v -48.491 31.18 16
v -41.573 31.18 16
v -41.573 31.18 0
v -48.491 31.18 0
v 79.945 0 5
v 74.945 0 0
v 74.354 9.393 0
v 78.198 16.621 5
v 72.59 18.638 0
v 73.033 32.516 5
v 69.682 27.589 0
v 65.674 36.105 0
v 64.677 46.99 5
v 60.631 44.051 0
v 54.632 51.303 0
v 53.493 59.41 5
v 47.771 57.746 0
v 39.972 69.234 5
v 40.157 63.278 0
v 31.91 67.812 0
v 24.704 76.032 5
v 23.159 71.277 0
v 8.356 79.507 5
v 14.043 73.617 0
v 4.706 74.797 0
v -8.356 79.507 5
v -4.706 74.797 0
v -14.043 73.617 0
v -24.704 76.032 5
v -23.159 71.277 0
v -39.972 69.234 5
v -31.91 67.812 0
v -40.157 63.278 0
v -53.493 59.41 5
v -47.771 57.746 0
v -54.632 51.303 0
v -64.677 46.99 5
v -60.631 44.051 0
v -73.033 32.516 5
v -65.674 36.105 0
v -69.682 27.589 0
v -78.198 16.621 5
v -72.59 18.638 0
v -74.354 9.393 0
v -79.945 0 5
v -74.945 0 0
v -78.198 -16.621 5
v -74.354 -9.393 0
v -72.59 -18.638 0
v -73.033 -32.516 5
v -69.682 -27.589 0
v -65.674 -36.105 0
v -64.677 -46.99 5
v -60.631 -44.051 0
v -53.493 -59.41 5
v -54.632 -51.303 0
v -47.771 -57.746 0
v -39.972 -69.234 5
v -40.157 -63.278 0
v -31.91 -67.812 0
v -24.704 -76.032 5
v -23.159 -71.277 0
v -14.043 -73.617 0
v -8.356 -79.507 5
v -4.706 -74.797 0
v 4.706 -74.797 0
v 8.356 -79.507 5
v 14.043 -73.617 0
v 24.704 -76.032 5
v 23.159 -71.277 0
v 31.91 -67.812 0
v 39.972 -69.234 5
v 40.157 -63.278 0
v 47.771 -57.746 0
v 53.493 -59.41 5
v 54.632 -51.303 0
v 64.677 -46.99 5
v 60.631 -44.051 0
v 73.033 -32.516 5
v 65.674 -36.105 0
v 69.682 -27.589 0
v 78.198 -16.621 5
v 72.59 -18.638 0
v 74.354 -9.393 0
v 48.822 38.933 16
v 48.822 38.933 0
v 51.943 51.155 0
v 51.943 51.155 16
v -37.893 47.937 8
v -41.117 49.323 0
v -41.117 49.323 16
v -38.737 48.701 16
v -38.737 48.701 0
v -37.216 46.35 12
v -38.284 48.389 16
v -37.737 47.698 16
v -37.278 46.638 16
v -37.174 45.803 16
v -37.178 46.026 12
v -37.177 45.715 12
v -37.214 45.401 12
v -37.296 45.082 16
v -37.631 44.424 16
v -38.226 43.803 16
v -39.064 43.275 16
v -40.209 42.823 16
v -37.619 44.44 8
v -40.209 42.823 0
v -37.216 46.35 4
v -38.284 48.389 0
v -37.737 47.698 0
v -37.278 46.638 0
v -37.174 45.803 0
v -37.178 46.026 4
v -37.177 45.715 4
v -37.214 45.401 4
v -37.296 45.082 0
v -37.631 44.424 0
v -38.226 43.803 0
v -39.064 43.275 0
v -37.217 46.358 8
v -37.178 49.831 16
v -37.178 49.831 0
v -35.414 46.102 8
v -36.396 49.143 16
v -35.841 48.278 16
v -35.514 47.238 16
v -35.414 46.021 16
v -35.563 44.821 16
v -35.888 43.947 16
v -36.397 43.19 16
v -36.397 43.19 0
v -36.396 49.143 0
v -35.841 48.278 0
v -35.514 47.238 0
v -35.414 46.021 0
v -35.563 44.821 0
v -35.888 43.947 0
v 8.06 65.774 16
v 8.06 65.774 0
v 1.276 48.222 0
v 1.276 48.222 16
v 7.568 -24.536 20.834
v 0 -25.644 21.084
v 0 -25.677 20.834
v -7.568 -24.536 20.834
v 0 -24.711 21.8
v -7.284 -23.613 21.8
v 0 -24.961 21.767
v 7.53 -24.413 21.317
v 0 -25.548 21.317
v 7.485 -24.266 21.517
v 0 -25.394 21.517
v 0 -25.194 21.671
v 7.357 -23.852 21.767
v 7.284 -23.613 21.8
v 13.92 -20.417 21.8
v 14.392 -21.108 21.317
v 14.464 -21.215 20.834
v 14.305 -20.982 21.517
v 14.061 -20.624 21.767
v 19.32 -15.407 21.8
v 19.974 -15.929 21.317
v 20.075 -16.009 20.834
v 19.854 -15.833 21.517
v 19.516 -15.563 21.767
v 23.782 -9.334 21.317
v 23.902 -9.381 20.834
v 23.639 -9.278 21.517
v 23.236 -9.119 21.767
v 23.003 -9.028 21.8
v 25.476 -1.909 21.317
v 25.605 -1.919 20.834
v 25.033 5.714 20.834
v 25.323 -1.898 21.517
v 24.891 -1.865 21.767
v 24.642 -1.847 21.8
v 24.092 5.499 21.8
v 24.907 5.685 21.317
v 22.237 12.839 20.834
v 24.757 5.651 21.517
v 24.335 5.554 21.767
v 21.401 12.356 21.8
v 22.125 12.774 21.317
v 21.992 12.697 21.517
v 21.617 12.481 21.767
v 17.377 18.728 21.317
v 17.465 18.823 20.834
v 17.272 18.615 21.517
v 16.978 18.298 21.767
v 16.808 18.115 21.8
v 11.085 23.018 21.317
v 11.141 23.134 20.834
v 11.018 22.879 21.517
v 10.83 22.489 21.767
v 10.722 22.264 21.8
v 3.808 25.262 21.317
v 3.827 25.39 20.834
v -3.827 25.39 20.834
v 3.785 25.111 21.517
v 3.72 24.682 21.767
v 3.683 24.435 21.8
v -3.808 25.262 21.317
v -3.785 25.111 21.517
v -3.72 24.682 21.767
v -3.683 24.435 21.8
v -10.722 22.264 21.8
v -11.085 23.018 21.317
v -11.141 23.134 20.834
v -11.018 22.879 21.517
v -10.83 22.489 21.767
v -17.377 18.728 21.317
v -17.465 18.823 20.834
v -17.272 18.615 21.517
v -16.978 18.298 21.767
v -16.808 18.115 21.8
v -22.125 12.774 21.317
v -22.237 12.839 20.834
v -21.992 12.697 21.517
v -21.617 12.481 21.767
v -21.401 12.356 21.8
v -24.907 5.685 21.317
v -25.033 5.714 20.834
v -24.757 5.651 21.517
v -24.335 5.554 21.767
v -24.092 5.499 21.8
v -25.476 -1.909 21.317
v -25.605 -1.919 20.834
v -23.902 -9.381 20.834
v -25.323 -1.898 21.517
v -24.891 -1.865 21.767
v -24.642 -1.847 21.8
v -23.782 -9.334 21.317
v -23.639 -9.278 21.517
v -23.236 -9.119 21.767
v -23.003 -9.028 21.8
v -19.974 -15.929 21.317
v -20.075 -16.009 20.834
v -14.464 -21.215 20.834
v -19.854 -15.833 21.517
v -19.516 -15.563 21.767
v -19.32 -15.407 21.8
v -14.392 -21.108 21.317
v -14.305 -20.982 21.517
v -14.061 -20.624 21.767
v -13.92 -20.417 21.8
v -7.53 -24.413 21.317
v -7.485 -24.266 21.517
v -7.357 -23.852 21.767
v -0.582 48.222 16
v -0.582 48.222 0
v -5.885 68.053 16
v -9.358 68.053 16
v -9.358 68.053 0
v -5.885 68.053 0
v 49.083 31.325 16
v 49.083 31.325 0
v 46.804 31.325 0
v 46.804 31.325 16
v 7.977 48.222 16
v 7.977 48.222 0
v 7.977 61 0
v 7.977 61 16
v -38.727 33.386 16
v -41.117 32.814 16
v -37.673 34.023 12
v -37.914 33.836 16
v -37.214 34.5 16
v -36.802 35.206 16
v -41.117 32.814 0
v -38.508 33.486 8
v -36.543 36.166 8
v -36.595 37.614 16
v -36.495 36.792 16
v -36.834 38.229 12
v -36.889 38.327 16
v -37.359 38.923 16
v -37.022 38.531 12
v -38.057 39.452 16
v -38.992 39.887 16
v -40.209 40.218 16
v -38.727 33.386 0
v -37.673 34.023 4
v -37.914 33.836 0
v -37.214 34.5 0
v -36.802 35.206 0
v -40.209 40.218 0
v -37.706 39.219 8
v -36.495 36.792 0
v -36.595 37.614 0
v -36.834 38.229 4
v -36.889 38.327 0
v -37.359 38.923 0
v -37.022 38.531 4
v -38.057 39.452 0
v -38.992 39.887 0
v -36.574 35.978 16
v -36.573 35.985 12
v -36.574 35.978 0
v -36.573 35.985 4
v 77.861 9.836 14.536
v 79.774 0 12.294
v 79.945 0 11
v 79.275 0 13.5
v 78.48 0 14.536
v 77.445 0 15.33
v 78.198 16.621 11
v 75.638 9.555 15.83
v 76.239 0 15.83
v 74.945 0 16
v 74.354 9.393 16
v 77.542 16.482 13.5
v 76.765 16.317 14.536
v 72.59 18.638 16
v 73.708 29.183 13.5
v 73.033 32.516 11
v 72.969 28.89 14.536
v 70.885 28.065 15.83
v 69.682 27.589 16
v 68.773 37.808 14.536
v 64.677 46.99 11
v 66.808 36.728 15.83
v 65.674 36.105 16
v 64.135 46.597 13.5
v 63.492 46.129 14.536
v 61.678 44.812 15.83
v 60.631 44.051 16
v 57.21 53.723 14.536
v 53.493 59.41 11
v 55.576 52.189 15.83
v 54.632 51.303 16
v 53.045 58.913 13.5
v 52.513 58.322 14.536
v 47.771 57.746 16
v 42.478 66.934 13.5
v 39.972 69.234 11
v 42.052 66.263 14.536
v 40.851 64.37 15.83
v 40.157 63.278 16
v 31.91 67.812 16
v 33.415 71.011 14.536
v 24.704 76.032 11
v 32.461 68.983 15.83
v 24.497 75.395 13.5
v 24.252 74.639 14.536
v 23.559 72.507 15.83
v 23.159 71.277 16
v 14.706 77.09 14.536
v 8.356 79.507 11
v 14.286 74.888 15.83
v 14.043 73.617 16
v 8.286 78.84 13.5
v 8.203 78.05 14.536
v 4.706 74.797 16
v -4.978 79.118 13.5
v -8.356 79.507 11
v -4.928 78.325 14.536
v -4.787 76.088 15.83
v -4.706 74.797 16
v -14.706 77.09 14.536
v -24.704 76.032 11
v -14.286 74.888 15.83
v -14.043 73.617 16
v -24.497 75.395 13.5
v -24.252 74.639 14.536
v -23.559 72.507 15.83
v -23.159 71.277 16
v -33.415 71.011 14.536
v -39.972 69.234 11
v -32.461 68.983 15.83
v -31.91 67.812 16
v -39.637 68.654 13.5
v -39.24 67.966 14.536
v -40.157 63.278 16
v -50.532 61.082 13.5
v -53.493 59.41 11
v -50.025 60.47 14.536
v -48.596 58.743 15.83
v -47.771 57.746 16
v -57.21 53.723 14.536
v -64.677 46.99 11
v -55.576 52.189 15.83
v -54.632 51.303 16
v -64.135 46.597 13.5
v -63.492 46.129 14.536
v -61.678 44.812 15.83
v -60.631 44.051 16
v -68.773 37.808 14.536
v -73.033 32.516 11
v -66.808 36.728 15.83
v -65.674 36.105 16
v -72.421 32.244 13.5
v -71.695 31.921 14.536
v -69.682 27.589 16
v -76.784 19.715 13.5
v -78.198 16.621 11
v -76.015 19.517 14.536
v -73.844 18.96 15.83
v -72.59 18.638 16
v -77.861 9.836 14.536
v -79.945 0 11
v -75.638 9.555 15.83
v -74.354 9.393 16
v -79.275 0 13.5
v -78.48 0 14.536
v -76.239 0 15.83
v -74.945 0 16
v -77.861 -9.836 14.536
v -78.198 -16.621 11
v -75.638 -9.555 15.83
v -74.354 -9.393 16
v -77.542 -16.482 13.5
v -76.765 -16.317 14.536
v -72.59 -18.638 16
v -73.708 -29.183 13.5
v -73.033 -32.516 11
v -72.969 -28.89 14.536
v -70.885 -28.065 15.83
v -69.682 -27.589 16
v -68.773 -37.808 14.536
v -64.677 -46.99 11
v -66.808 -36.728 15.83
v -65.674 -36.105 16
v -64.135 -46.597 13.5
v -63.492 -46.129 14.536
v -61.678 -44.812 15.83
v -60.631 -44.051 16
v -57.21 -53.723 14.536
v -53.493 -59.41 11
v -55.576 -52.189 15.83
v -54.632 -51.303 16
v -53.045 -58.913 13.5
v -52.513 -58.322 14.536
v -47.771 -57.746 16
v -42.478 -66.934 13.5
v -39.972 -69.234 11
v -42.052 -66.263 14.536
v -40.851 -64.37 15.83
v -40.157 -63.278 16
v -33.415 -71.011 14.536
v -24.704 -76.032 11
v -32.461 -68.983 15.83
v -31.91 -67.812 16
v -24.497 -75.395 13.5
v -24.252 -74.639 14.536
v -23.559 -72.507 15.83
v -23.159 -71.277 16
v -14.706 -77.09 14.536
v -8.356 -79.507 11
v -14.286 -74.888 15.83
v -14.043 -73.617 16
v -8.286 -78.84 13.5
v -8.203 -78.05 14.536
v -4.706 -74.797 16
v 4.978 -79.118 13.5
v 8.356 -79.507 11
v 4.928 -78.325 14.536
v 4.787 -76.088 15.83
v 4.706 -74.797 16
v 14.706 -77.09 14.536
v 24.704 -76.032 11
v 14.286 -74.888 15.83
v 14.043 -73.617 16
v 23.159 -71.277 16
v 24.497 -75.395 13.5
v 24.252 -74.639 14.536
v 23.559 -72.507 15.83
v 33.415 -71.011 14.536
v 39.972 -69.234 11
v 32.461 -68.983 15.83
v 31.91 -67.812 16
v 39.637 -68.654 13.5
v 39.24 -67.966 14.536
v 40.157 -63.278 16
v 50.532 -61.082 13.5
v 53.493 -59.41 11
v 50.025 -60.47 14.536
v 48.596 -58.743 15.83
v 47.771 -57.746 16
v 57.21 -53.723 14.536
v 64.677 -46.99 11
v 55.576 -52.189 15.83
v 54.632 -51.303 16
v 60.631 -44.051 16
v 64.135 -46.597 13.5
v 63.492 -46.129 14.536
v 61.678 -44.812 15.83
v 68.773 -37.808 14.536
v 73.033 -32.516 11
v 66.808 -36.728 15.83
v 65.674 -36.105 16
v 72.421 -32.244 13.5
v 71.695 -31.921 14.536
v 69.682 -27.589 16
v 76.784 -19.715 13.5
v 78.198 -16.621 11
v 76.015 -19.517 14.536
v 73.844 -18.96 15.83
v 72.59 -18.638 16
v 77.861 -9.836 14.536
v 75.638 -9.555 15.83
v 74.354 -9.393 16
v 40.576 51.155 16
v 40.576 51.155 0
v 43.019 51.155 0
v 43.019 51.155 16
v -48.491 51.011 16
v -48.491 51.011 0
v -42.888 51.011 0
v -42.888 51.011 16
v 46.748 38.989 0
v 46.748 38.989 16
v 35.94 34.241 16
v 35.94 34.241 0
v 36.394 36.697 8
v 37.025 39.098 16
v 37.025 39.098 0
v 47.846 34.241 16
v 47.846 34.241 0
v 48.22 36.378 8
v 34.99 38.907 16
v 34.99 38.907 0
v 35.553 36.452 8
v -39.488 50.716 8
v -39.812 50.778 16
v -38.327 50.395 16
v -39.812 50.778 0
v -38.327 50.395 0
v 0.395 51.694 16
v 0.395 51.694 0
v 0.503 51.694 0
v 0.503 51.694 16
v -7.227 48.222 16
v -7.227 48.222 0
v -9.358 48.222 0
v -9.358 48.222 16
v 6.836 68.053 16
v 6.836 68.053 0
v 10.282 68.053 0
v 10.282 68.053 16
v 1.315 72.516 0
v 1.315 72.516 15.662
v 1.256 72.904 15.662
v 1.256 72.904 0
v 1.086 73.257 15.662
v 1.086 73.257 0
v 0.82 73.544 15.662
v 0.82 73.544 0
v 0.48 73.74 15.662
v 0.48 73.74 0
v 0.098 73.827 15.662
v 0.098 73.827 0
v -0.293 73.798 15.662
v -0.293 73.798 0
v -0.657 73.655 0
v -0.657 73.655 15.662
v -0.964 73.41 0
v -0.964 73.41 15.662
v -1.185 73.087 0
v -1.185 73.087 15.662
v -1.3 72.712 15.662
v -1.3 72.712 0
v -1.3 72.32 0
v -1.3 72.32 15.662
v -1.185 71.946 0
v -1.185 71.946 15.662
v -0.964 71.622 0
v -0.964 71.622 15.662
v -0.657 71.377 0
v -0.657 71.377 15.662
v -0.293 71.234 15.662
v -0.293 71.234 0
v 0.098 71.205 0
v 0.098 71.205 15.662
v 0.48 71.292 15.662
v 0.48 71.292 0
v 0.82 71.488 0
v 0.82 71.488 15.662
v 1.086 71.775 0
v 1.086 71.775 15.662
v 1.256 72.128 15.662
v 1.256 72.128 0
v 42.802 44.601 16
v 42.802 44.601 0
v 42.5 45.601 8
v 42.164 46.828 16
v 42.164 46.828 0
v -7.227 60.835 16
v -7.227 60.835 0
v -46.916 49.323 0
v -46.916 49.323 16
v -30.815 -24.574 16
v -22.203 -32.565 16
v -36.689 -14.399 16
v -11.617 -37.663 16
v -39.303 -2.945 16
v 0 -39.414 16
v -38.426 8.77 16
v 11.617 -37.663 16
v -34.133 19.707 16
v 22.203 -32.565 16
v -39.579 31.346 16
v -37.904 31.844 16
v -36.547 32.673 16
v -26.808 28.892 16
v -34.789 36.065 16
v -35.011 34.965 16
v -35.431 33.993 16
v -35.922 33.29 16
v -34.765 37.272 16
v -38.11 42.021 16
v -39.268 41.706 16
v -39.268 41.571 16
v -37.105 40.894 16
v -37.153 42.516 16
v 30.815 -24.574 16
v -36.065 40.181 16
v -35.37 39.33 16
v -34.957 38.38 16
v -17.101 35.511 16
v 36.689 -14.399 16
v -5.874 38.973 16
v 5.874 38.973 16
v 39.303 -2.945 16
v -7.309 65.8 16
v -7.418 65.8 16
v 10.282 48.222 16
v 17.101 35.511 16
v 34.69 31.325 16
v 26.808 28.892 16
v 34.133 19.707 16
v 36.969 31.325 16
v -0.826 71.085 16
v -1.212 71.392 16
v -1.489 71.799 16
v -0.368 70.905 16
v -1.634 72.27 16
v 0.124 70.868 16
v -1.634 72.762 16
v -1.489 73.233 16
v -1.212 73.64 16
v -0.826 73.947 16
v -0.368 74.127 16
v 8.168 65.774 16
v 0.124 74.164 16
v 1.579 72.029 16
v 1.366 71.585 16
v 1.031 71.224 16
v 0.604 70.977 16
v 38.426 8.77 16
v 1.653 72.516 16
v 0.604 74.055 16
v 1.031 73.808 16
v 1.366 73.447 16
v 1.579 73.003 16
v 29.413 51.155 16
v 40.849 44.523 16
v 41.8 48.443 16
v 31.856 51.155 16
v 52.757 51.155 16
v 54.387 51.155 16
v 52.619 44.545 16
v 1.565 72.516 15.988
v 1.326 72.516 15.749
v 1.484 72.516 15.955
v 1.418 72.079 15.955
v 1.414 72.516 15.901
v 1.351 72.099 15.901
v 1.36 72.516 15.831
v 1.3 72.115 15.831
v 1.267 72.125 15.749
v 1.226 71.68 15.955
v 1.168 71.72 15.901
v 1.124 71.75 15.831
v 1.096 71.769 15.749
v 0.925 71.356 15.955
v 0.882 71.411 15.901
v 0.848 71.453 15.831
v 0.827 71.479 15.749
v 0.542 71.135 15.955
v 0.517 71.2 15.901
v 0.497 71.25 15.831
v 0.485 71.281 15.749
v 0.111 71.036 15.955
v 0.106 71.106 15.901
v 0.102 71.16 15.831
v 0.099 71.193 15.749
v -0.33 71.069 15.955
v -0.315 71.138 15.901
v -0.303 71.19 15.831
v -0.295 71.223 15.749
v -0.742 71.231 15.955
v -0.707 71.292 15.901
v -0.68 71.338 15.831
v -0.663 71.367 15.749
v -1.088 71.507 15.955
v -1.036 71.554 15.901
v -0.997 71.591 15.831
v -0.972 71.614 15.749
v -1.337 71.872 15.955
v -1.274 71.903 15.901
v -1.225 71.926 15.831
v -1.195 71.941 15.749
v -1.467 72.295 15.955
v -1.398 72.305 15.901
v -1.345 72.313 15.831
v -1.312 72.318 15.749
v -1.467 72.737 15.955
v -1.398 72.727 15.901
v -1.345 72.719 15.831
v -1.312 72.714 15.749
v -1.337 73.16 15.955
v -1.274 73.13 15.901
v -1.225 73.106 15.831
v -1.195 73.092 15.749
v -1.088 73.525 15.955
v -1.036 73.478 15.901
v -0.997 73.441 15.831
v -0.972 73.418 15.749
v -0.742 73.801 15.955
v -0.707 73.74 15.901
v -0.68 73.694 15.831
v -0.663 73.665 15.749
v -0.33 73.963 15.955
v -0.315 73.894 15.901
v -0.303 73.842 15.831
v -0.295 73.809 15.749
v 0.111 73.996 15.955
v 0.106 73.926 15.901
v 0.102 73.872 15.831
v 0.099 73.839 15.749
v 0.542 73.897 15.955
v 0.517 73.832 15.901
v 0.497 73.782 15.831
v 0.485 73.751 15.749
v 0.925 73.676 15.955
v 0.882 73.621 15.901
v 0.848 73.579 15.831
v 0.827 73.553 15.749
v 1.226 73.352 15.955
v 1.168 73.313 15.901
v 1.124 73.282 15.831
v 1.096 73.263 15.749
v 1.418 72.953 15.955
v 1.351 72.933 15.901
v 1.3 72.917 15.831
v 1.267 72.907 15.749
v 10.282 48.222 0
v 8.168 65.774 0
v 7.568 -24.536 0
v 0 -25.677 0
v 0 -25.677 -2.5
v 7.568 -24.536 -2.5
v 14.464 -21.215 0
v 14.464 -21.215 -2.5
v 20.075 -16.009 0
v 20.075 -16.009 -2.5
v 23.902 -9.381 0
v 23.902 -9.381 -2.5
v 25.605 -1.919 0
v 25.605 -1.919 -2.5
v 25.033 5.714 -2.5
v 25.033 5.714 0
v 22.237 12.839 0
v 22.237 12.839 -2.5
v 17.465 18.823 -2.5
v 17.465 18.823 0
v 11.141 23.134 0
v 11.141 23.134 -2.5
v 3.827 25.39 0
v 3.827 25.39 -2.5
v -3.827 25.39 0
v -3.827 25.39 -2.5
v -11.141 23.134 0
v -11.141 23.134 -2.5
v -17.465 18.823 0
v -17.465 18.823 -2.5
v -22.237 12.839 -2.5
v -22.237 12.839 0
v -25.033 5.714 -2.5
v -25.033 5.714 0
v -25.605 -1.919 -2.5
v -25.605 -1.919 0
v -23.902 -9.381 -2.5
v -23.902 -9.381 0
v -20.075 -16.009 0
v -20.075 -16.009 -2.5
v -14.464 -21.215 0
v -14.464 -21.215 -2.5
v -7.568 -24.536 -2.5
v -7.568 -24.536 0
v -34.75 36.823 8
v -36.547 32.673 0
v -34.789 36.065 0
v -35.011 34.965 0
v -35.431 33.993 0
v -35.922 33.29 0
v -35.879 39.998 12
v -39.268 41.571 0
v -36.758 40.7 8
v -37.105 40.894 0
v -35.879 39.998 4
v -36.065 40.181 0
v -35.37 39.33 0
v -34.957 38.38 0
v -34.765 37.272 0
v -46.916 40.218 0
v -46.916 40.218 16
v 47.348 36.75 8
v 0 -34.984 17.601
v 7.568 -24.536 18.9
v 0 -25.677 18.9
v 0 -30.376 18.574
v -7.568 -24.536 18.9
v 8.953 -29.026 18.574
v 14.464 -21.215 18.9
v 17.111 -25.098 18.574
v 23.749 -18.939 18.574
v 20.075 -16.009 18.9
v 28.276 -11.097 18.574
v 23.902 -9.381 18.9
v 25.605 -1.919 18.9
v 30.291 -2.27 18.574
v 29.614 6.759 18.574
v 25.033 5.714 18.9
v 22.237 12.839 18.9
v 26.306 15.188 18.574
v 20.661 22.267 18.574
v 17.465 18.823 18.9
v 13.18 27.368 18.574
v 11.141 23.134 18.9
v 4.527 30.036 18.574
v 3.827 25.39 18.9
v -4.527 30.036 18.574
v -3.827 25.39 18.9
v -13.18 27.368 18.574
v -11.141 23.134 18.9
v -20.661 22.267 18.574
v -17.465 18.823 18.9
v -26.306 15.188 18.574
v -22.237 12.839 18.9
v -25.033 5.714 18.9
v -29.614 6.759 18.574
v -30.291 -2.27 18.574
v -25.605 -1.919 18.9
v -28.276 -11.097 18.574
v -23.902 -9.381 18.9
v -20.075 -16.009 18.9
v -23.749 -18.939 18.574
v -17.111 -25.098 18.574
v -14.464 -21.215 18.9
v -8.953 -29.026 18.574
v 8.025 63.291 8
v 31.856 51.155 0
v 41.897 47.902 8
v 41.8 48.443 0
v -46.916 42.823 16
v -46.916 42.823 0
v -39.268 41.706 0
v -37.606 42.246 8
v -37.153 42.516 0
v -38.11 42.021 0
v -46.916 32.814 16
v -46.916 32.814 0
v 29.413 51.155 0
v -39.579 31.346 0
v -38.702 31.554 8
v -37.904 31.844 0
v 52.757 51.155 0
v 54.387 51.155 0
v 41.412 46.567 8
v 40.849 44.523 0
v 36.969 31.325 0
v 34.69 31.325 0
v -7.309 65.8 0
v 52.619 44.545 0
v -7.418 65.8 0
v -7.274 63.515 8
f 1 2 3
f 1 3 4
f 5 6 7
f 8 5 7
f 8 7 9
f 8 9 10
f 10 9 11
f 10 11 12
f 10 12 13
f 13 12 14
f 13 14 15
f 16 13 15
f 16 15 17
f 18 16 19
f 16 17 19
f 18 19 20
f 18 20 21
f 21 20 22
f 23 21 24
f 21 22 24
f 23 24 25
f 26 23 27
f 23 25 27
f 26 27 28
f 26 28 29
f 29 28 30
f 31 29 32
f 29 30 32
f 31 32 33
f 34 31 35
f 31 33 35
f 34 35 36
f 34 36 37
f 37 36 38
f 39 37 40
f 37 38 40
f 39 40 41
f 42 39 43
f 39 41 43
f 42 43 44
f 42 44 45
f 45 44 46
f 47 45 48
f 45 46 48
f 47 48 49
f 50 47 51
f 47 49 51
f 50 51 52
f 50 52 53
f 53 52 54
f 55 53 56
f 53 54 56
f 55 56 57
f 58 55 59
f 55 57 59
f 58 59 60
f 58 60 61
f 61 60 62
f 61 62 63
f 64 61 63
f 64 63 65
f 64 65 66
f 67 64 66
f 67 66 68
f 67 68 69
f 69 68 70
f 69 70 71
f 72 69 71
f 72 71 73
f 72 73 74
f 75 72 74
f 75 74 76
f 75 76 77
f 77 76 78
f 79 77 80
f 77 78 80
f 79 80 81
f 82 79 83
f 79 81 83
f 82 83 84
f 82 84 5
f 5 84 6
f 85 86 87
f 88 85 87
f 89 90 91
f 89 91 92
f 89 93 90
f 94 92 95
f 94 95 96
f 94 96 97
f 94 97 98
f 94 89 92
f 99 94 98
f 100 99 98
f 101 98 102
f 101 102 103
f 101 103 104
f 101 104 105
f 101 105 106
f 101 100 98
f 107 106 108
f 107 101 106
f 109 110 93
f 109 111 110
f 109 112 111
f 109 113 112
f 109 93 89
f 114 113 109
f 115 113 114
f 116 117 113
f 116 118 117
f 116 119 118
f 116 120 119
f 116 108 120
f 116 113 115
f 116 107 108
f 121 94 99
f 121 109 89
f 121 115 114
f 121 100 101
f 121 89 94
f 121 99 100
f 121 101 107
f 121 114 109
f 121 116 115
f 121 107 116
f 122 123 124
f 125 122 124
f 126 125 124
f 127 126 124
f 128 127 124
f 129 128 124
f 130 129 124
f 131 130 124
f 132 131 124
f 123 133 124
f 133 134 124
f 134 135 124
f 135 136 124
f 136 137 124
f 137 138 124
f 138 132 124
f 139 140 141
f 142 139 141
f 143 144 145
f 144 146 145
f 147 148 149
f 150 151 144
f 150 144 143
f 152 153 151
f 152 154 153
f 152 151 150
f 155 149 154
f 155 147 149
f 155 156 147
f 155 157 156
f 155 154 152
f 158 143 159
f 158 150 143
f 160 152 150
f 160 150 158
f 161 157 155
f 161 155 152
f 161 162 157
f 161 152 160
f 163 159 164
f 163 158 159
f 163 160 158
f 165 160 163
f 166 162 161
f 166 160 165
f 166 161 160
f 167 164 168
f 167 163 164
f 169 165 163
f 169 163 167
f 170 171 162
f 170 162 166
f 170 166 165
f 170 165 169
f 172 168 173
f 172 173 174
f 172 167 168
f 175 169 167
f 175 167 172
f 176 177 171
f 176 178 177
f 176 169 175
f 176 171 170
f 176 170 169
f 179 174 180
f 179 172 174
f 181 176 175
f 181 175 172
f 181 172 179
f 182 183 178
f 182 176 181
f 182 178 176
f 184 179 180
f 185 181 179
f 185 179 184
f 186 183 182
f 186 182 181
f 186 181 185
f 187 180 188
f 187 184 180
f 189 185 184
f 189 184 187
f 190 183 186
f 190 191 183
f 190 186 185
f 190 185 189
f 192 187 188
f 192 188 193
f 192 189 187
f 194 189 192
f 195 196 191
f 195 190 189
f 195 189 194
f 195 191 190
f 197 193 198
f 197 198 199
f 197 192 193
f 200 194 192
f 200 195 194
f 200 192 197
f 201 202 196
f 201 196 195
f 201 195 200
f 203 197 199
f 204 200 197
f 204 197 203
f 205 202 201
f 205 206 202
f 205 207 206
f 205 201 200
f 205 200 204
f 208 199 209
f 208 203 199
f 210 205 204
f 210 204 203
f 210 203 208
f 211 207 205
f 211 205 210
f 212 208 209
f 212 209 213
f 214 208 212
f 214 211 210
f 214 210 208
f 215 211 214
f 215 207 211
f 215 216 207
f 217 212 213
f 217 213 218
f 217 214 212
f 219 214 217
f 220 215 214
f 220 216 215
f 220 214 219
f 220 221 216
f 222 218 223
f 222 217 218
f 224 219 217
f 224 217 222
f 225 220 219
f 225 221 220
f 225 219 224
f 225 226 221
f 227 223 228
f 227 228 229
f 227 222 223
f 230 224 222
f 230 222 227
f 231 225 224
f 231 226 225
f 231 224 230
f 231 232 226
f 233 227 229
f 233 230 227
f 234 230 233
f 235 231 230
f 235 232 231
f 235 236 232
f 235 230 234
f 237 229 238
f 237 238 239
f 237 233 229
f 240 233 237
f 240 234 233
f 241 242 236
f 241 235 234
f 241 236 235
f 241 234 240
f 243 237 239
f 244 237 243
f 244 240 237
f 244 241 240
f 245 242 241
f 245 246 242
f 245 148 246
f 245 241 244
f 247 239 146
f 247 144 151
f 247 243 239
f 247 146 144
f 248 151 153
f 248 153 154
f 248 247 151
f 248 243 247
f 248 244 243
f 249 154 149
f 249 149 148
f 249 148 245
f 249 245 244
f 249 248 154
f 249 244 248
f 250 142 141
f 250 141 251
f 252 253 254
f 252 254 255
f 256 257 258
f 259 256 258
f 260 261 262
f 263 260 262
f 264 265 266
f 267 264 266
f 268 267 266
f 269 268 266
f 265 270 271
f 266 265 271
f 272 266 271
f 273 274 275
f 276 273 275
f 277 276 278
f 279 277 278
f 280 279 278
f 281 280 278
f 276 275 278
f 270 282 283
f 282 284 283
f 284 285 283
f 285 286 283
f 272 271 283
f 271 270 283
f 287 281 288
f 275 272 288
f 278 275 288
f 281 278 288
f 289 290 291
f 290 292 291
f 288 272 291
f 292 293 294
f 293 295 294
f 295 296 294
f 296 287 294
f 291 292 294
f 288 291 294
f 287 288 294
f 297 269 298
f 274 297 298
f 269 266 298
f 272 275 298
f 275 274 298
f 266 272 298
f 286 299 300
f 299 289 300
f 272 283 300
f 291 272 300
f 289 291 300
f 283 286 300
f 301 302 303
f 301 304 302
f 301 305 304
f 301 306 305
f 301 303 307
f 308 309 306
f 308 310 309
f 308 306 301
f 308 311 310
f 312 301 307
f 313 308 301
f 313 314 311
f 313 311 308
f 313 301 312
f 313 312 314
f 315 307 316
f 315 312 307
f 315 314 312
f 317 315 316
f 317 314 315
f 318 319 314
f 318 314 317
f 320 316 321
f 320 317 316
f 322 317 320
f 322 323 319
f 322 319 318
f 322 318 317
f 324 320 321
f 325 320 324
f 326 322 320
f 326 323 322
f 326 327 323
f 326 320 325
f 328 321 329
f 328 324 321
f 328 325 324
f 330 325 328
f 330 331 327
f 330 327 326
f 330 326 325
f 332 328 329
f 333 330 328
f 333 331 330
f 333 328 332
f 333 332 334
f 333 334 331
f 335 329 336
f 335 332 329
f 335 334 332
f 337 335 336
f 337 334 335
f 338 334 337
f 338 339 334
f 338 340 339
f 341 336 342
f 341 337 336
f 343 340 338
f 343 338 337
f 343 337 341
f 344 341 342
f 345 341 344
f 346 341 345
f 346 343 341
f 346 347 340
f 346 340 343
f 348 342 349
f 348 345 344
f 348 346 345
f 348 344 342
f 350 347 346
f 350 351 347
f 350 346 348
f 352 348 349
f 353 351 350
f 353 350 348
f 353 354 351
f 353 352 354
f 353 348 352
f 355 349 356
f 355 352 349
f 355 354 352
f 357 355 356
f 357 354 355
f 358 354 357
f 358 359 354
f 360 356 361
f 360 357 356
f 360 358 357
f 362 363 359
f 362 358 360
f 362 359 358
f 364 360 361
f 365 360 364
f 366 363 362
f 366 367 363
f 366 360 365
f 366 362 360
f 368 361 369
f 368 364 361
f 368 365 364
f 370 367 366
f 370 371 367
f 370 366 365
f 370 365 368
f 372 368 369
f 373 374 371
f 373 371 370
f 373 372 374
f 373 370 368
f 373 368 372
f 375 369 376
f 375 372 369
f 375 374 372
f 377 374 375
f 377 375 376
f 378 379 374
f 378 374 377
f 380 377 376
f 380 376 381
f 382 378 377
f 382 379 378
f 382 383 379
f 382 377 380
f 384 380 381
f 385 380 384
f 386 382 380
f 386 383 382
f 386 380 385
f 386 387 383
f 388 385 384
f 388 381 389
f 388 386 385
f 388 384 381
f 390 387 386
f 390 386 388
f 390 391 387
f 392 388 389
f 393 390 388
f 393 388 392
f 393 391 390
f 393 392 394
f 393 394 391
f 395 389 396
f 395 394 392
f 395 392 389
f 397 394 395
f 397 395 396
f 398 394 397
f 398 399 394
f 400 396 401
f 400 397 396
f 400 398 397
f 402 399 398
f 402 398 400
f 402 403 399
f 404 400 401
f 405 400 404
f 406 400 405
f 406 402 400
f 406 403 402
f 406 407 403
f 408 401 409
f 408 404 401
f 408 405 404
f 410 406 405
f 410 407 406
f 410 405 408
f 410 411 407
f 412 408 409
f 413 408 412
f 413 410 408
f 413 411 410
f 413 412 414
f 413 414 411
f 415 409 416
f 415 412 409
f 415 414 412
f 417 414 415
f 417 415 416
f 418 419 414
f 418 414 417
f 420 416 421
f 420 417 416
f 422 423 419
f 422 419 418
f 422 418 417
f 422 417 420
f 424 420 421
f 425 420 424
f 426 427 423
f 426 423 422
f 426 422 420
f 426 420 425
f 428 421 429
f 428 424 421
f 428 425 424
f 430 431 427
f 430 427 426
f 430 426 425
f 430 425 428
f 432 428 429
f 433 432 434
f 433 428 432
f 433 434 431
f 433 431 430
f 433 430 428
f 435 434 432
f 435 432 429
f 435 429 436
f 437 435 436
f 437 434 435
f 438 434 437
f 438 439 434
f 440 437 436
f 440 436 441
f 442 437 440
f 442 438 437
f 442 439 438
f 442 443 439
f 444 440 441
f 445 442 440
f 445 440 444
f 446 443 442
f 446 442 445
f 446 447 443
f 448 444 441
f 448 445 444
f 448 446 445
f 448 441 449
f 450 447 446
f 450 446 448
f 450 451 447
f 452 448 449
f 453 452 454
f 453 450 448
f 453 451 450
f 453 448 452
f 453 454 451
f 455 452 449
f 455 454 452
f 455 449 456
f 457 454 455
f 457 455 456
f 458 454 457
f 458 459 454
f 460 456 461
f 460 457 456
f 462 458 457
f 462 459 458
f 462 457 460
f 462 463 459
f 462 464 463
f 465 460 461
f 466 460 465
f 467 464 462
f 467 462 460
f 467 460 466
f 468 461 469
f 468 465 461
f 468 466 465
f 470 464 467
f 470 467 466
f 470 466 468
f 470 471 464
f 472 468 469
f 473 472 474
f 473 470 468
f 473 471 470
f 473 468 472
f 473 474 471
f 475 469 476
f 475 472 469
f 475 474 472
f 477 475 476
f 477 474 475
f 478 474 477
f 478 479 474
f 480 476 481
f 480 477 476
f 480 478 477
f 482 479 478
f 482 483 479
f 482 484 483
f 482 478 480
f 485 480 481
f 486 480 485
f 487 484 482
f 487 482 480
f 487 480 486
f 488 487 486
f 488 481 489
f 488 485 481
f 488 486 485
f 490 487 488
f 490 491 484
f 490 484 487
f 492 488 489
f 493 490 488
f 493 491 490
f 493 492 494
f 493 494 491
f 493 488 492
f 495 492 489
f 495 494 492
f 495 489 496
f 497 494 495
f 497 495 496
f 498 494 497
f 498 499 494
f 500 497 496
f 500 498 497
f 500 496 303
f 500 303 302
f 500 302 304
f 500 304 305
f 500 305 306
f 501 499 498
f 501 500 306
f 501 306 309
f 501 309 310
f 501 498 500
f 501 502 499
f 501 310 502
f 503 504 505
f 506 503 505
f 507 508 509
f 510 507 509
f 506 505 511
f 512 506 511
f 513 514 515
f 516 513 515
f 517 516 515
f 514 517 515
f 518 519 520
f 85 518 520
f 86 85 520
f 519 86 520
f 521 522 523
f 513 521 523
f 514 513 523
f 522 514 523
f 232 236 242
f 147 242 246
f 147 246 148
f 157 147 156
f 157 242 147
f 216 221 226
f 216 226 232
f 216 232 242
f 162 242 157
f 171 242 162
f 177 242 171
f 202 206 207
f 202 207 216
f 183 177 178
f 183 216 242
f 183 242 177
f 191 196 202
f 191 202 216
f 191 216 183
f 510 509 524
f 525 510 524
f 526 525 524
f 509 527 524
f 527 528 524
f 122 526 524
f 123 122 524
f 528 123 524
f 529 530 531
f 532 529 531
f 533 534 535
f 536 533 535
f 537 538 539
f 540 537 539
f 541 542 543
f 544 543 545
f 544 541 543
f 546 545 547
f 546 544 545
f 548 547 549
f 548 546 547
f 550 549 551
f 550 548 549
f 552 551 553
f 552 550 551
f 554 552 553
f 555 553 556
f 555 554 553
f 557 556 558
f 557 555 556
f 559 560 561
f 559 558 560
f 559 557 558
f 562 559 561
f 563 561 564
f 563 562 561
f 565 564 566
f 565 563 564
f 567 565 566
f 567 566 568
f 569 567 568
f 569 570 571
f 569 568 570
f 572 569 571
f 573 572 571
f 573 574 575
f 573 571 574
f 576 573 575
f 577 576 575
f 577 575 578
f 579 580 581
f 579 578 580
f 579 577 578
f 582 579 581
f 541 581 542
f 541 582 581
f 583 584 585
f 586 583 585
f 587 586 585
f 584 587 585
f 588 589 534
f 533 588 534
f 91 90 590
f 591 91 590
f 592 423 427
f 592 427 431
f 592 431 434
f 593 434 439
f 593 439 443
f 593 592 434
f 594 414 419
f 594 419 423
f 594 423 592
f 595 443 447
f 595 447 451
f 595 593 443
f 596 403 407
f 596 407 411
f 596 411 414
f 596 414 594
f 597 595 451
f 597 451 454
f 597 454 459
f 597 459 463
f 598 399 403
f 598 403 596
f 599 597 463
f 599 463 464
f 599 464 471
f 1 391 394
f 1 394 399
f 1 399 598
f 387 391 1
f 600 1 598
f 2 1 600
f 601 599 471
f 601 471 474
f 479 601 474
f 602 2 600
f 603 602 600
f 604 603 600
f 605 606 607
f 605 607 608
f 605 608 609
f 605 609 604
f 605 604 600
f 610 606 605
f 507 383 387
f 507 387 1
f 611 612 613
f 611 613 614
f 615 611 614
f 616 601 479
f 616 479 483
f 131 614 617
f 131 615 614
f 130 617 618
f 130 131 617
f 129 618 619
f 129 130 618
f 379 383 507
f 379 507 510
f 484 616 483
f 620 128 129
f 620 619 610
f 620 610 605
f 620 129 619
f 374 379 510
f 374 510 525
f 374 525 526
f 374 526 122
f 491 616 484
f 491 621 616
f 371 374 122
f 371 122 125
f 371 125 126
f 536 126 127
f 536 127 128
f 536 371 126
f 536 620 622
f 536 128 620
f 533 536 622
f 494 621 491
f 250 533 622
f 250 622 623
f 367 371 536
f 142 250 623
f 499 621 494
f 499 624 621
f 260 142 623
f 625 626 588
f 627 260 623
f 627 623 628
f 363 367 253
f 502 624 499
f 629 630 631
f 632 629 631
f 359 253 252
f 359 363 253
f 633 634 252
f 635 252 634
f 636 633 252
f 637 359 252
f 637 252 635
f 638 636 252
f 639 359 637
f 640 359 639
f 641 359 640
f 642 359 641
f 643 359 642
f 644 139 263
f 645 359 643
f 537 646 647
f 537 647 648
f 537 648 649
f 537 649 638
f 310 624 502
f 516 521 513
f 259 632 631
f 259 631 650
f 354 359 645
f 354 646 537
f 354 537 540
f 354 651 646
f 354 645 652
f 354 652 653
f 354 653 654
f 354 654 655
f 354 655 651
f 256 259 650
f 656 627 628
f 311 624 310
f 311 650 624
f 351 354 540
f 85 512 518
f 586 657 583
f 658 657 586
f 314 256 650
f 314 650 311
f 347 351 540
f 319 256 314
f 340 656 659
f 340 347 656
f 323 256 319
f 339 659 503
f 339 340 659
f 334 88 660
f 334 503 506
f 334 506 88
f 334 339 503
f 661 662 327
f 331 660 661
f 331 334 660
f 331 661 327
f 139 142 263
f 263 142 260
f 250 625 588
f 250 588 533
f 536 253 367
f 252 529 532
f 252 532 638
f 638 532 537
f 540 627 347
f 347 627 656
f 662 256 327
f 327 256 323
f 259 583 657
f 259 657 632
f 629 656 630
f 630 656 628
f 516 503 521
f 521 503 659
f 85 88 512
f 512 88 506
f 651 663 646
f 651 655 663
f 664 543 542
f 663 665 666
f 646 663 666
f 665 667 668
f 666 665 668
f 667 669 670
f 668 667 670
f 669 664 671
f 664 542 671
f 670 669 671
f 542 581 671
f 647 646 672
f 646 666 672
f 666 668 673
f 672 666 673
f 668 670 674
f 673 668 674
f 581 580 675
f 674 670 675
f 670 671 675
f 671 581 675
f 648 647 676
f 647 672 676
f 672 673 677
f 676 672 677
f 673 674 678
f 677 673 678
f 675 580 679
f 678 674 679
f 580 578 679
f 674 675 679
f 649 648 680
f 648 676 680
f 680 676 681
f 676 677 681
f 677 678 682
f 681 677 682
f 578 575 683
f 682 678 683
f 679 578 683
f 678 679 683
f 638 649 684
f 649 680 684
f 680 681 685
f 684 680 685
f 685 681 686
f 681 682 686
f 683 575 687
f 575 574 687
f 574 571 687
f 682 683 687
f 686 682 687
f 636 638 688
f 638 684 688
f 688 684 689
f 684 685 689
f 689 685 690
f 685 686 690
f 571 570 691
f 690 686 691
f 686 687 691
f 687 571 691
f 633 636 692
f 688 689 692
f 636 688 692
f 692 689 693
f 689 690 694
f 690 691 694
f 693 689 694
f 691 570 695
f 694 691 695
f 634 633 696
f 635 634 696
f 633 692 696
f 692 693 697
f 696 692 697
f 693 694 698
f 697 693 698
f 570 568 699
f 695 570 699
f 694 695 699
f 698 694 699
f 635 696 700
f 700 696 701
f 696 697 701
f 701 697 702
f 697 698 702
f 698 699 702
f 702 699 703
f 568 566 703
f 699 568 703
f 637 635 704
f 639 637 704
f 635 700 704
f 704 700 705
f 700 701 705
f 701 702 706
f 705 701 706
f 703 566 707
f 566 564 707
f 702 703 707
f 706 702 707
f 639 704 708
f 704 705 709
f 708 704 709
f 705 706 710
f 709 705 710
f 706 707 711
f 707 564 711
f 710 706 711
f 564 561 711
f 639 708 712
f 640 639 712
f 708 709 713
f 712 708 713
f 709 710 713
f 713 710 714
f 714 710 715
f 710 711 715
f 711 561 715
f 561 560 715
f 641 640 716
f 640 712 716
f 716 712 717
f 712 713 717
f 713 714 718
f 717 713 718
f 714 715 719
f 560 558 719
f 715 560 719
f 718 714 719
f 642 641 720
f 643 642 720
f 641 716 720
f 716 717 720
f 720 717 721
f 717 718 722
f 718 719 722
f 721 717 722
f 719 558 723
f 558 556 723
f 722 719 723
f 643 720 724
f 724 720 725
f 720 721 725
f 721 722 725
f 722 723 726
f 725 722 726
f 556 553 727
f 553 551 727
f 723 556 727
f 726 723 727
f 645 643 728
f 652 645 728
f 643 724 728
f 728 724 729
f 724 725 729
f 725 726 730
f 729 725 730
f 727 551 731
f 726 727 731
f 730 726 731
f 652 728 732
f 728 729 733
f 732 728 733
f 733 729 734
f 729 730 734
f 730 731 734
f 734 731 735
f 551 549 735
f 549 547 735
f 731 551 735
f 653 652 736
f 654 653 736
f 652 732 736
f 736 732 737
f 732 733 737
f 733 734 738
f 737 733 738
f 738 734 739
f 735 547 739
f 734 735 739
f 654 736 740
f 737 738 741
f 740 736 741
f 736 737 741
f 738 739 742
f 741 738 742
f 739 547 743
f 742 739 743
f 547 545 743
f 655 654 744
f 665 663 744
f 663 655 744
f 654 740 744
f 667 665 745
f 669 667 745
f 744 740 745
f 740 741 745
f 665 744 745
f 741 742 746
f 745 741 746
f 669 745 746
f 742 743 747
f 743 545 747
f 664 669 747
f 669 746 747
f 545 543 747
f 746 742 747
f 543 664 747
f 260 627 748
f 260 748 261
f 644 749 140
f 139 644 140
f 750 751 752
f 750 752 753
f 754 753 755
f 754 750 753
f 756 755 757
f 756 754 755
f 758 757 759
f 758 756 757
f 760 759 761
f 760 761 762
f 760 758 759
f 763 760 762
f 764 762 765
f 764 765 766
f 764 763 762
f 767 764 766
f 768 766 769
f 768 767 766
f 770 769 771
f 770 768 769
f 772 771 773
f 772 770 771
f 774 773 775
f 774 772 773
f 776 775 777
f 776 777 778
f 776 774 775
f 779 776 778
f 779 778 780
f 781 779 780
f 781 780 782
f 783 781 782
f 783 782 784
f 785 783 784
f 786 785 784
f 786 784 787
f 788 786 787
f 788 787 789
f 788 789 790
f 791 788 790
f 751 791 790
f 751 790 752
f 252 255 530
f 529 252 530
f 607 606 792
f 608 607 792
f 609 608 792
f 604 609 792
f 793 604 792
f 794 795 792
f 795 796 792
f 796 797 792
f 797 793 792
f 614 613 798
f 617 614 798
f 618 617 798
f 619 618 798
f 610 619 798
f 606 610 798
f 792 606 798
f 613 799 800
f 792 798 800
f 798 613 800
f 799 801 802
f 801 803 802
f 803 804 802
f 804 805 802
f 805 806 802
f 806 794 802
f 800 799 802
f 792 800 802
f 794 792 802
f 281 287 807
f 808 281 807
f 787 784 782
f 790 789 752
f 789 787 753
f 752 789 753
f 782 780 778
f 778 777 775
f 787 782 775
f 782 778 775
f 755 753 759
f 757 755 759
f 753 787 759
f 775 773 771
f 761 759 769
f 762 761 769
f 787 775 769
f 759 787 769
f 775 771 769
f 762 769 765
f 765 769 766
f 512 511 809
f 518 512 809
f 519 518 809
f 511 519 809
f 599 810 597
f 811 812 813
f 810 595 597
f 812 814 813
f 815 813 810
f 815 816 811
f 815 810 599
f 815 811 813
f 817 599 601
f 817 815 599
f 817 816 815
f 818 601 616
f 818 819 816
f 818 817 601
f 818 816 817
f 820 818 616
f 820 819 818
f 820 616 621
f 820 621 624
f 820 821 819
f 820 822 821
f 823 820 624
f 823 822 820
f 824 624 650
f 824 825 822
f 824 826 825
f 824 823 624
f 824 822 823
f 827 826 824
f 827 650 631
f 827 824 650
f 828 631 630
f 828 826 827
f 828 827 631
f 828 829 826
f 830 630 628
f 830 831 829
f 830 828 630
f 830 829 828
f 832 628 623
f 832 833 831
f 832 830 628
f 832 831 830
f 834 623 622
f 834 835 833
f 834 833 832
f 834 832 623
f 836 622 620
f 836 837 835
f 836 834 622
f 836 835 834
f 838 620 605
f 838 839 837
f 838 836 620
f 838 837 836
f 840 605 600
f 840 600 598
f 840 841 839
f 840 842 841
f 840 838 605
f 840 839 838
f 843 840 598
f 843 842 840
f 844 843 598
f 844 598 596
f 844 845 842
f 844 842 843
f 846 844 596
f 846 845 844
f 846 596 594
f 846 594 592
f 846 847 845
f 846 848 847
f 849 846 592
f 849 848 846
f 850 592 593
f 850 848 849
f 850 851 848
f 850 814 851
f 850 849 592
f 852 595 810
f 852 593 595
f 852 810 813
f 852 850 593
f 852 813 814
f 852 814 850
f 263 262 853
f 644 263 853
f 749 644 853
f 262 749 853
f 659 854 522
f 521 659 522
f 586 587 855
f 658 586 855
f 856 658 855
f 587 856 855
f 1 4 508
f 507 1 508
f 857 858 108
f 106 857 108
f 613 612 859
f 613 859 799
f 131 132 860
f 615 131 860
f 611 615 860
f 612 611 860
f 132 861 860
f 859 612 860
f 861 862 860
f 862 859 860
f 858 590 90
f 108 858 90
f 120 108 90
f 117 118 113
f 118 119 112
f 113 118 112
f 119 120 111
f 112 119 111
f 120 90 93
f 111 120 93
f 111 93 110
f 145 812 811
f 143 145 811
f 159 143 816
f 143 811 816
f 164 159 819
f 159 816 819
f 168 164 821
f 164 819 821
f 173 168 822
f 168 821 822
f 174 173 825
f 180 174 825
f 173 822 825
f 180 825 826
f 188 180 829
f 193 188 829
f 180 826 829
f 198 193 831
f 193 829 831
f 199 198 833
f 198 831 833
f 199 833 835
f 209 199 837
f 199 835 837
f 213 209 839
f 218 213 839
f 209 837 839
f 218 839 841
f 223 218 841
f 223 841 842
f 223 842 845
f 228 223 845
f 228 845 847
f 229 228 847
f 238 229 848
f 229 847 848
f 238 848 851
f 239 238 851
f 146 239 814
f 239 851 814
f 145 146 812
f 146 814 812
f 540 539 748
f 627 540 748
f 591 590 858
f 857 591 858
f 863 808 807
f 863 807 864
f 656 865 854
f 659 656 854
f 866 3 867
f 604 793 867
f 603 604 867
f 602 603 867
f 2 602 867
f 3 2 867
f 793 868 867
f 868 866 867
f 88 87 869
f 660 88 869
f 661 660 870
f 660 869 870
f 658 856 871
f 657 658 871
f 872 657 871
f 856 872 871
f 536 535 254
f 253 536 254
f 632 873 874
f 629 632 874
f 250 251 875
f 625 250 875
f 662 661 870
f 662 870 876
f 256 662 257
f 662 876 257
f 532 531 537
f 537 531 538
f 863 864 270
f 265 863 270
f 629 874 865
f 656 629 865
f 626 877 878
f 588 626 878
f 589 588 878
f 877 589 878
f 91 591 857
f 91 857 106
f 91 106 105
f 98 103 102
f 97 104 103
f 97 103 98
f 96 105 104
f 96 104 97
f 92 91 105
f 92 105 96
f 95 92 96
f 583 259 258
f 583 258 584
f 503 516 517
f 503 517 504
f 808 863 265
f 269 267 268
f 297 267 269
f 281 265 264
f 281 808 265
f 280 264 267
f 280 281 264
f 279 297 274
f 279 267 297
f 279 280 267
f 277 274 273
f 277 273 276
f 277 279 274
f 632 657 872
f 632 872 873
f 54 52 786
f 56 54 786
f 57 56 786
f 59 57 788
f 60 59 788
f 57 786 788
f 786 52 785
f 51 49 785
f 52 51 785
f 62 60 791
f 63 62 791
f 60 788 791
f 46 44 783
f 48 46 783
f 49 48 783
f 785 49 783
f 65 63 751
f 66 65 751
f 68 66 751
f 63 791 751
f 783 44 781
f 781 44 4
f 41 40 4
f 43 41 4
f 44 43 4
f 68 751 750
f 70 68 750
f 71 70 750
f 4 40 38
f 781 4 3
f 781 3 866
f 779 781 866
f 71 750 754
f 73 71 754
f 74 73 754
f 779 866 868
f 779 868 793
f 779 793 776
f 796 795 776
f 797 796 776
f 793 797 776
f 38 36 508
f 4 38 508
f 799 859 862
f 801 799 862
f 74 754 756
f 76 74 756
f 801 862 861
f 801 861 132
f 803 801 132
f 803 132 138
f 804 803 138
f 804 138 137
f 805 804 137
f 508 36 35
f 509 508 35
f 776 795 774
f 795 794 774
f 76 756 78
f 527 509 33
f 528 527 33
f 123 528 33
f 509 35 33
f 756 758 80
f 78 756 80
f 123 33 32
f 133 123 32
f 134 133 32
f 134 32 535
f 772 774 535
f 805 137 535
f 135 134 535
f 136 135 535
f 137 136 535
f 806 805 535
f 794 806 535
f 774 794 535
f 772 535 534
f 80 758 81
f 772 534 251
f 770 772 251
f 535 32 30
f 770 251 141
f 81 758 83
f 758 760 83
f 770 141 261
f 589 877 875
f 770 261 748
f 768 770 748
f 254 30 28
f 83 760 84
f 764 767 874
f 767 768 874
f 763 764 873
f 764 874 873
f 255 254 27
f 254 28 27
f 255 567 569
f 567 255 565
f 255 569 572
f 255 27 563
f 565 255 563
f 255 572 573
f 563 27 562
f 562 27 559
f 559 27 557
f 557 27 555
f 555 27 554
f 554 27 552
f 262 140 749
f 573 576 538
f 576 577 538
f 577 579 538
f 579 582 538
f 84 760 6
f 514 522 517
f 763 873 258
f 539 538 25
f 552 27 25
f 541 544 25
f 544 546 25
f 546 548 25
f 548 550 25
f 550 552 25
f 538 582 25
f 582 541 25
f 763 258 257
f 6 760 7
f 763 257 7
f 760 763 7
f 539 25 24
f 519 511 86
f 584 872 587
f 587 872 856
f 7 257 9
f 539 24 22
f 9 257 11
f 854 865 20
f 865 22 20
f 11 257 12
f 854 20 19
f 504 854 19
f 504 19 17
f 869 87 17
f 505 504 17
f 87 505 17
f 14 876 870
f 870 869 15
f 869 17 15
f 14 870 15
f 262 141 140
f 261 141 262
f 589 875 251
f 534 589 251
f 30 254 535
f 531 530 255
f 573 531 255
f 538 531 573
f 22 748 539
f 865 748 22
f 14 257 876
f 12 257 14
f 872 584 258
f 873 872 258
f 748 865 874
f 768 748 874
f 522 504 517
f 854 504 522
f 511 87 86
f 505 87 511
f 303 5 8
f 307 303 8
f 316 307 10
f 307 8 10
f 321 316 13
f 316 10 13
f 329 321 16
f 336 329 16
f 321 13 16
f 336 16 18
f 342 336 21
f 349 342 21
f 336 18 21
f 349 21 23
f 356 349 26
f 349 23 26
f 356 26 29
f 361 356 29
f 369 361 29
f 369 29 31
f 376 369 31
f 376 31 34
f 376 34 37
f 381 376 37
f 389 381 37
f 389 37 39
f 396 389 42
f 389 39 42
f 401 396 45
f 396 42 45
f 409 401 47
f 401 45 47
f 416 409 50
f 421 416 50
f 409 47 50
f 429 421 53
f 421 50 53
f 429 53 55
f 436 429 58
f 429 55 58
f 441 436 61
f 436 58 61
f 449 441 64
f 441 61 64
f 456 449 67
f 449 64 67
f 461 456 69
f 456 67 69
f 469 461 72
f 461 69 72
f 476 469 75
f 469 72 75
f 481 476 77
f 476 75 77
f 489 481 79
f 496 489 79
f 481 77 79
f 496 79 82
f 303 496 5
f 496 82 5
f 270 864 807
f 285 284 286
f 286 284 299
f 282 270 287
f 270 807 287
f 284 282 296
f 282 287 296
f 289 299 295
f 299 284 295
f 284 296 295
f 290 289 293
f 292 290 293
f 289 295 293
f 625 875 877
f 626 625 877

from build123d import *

# Parameters (mm, degrees)
F1_DEPTH   = 18.9
F0_R       = 79.944620776
F2_DEPTH   = 16
F4_R       = 5
F5_SIZE    = 5
F6_DEPTH   = 3
F8_DEPTH   = 2.9
F12_DEPTH  = 16
F13_DEPTH  = 24.3
F15_R      = 0.9656854249
F16_R      = 2.2829721339
F17_DEPTH  = 48.9
F18_R      = 1.3148708501
F18_R_2    = 0.6355346819
F19_DEPTH  = 41.5
F19_FACE_R = 0.6355346819
F20_DEPTH  = 21.5
F21_R      = 0.3379898987


# Not quite as in the source:
# - a fillet or chamfer that OpenCascade refuses, or shapes differently, is made with other operations: its cross-section is extruded or revolved along the edge and cut away or added
# - the program builds the solid bodies; features that only make, move or delete a surface that nothing else refers to are left out


with BuildPart() as f1:
    # F0 (on Top) → F1 (new body)
    with BuildSketch(Plane.XY):
        with BuildLine():
            Line((0, 0), (0, 41.5136932319))
            ThreePointArc((0, 41.5136932319), (-29.3546139964, 29.3546139964), (-41.5136932319, 0))
            Line((-41.5136932319, 0), (0, 0))
        make_face()
        with BuildLine():
            Line((0, 0), (41.5136932319, 0))
            ThreePointArc((41.5136932319, 0), (29.3546139964, 29.3546139964), (0, 41.5136932319))
            Line((0, 41.5136932319), (0, 0))
        make_face()
        with BuildLine():
            ThreePointArc((-41.5136932319, 0), (-29.3546139964, -29.3546139964), (0, -41.5136932319))
            Line((0, -41.5136932319), (0, 0))
            Line((0, 0), (-41.5136932319, 0))
        make_face()
        with BuildLine():
            ThreePointArc((0, -41.5136932319), (29.3546139964, -29.3546139964), (41.5136932319, 0))
            Line((41.5136932319, 0), (0, 0))
            Line((0, 0), (0, -41.5136932319))
        make_face()
    extrude(amount=F1_DEPTH)

    # F0 (on Top) → F2 (join)
    with BuildSketch(Plane.XY):
        Circle(F0_R)
        with BuildLine():
            Line((-48.4910080516, 31.1804282402), (-48.4910080516, 51.0111574069))
            Line((-48.4910080516, 51.0111574069), (-42.8877094405, 51.0111574069))
            add(Edge.make_bspline(
                [(-42.8877094405, 51.0111574069), (-38.9423969405, 51.0111574069), (-37.1780740238, 49.8306018513)],
                knots=[0, 0, 0, 1, 1, 1], degree=2))
            add(Edge.make_bspline(
                [(-37.1780740238, 49.8306018513), (-35.4137511071, 48.6500462958), (-35.4137511071, 46.1023032402)],
                knots=[0, 0, 0, 1, 1, 1], degree=2))
            add(Edge.make_bspline(
                [(-35.4137511071, 46.1023032402), (-35.4137511071, 44.3358101847), (-36.3968240238, 43.1899768513)],
                knots=[0, 0, 0, 1, 1, 1], degree=2))
            add(Edge.make_bspline(
                [(-36.3968240238, 43.1899768513), (-37.3798969405, 42.044143518), (-39.2679177738, 41.7056018513)],
                knots=[0, 0, 0, 1, 1, 1], degree=2))
            Line((-39.2679177738, 41.7056018513), (-39.2679177738, 41.5710532402))
            add(Edge.make_bspline(
                [(-39.2679177738, 41.5710532402), (-34.7496886071, 40.7984837958), (-34.7496886071, 36.8227893513)],
                knots=[0, 0, 0, 1, 1, 1], degree=2))
            add(Edge.make_bspline(
                [(-34.7496886071, 36.8227893513), (-34.7496886071, 34.1665393513), (-36.5465636071, 32.6734837958)],
                knots=[0, 0, 0, 1, 1, 1], degree=2))
            add(Edge.make_bspline(
                [(-36.5465636071, 32.6734837958), (-38.3434386071, 31.1804282402), (-41.5726052738, 31.1804282402)],
                knots=[0, 0, 0, 1, 1, 1], degree=2))
            Line((-41.5726052738, 31.1804282402), (-48.4910080516, 31.1804282402))
        make_face(mode=Mode.SUBTRACT)
        with BuildLine():
            ThreePointArc((0, 41.5136932319), (29.3546139964, 29.3546139964), (41.5136932319, 0))
            ThreePointArc((41.5136932319, 0), (29.3546139964, -29.3546139964), (0, -41.5136932319))
            ThreePointArc((0, -41.5136932319), (-29.3546139964, -29.3546139964), (-41.5136932319, 0))
            ThreePointArc((-41.5136932319, 0), (-29.3546139964, 29.3546139964), (0, 41.5136932319))
        make_face(mode=Mode.SUBTRACT)
        with BuildLine():
            Line((1.2760416667, 48.2220121983), (-0.5815972222, 48.2220121983))
            Line((-0.5815972222, 48.2220121983), (-7.3090277778, 65.8001371983))
            Line((-7.3090277778, 65.8001371983), (-7.4175347222, 65.8001371983))
            add(Edge.make_bspline(
                [(-7.4175347222, 65.8001371983), (-7.2265625, 63.7124635872), (-7.2265625, 60.8348594206)],
                knots=[0, 0, 0, 1, 1, 1], degree=2))
            Line((-7.2265625, 60.8348594206), (-7.2265625, 48.2220121983))
            Line((-7.2265625, 48.2220121983), (-9.3576388889, 48.2220121983))
            Line((-9.3576388889, 48.2220121983), (-9.3576388889, 68.052741365))
            Line((-9.3576388889, 68.052741365), (-5.8854166667, 68.052741365))
            Line((-5.8854166667, 68.052741365), (0.3949652778, 51.6942344206))
            Line((0.3949652778, 51.6942344206), (0.5034722222, 51.6942344206))
            Line((0.5034722222, 51.6942344206), (6.8359375, 68.052741365))
            Line((6.8359375, 68.052741365), (10.2821180556, 68.052741365))
            Line((10.2821180556, 68.052741365), (10.2821180556, 48.2220121983))
            Line((10.2821180556, 48.2220121983), (7.9774305556, 48.2220121983))
            Line((7.9774305556, 48.2220121983), (7.9774305556, 60.9997899761))
            add(Edge.make_bspline(
                [(7.9774305556, 60.9997899761), (7.9774305556, 63.1959705317), (8.1684027778, 65.7740955317)],
                knots=[0, 0, 0, 1, 1, 1], degree=2))
            Line((8.1684027778, 65.7740955317), (8.0598958333, 65.7740955317))
            Line((8.0598958333, 65.7740955317), (1.2760416667, 48.2220121983))
        make_face(mode=Mode.SUBTRACT)
        with BuildLine():
            Line((54.386543, 51.1552815385), (49.0827235555, 31.3245523718))
            Line((49.0827235555, 31.3245523718), (46.8040777222, 31.3245523718))
            Line((46.8040777222, 31.3245523718), (42.8023416111, 44.601462094))
            add(Edge.make_bspline(
                [(42.8023416111, 44.601462094), (42.5158832777, 45.4868787607), (42.1643207777, 46.828024594)],
                knots=[0, 0, 0, 1, 1, 1], degree=2))
            add(Edge.make_bspline(
                [(42.1643207777, 46.828024594), (41.8127582777, 48.1691704274), (41.7997374444, 48.4426079274)],
                knots=[0, 0, 0, 1, 1, 1], degree=2))
            add(Edge.make_bspline(
                [(41.7997374444, 48.4426079274), (41.5002582777, 46.6500732051), (40.8492166111, 44.523337094)],
                knots=[0, 0, 0, 1, 1, 1], degree=2))
            Line((40.8492166111, 44.523337094), (36.9690082777, 31.3245523718))
            Line((36.9690082777, 31.3245523718), (34.6903624444, 31.3245523718))
            Line((34.6903624444, 31.3245523718), (29.4125846666, 51.1552815385))
            Line((29.4125846666, 51.1552815385), (31.8561610555, 51.1552815385))
            Line((31.8561610555, 51.1552815385), (34.9898416111, 38.9070176496))
            add(Edge.make_bspline(
                [(34.9898416111, 38.9070176496), (35.6408832777, 36.3288926496), (35.9403624444, 34.2412190385)],
                knots=[0, 0, 0, 1, 1, 1], degree=2))
            add(Edge.make_bspline(
                [(35.9403624444, 34.2412190385), (36.3049457777, 36.7238579274), (37.0254318888, 39.0979898718)],
                knots=[0, 0, 0, 1, 1, 1], degree=2))
            Line((37.0254318888, 39.0979898718), (40.5757791111, 51.1552815385))
            Line((40.5757791111, 51.1552815385), (43.0193555, 51.1552815385))
            Line((43.0193555, 51.1552815385), (46.7476541111, 38.9894829274))
            add(Edge.make_bspline(
                [(46.7476541111, 38.9894829274), (47.3986957777, 36.8844482051), (47.8457443888, 34.2412190385)],
                knots=[0, 0, 0, 1, 1, 1], degree=2))
            add(Edge.make_bspline(
                [(47.8457443888, 34.2412190385), (48.1061610555, 36.1683023718), (48.8223068888, 38.9330593162)],
                knots=[0, 0, 0, 1, 1, 1], degree=2))
            Line((48.8223068888, 38.9330593162), (51.9429666111, 51.1552815385))
            Line((51.9429666111, 51.1552815385), (54.386543, 51.1552815385))
        make_face(mode=Mode.SUBTRACT)
    extrude(amount=F2_DEPTH)

    # F3: chamfer of 5 on 1 edges, made by hand


with BuildPart() as f3_tool2:
    # F3_s3 → F3_t4 (revolve)
    with BuildSketch(Plane.YZ):
        Polygon((-41.5136932319, 13.9), (-36.5136932319, 18.9), (-41.5136932319, 18.9), align=None)
    revolve(axis=Axis((0, 0, 18.9), (0, 0, 1)))

    split(bisect_by=Plane.XY.offset(16), keep=Keep.TOP)


with BuildPart() as f1_1:
    add(f1.part)

    # F3_t1: cut F3_tool2
    add(f3_tool2.part, mode=Mode.SUBTRACT)

    # F4
    f4_edges = [f1_1.edges().sort_by_distance(p)[0] for p in [
        (-79.944621, 0, 16),
    ]]
    fillet(f4_edges, radius=F4_R)

    # F5
    f5_edges = [f1_1.edges().sort_by_distance(p)[0] for p in [
        (-79.944621, 0, 0),
    ]]
    chamfer(f5_edges, length=F5_SIZE)

    # F6 (add): a face of the model
    f6_faces = [f1_1.faces().sort_by_distance(p)[0] for p in [
        (0, 0, 18.9),
    ]]
    extrude(f6_faces, amount=-F6_DEPTH)

    # F7: fillet of radius 33.9837993167 on 1 edges, made by hand

    # F7_s1 → F7_t2 (revolve, cut)
    with BuildSketch(Plane.YZ):
        with BuildLine():
            ThreePointArc((-39.4136932319, 16), (-32.6967485164, 18.1670970169), (-25.677025658, 18.9))
            Line((-25.677025658, 18.9), (-36.5136932319, 18.9))
            Line((-36.5136932319, 18.9), (-39.4136932319, 16))
        make_face()
    revolve(axis=Axis((0, 0, 18.9), (0, 0, 1)), mode=Mode.SUBTRACT)

    # F8 (add): a face of the model
    f8_faces = [f1_1.faces().sort_by_distance(p)[0] for p in [
        (0, 0, 18.9),
    ]]
    extrude(f8_faces, amount=F8_DEPTH)

    # F13 (add): a face of the model
    f13_faces = [f1_1.faces().sort_by_distance(p)[0] for p in [
        (0, 0, 21.8),
    ]]
    extrude(f13_faces, amount=-F13_DEPTH)

    # F15
    f15_edges = [f1_1.edges().sort_by_distance(p)[0] for p in [
        (0, 25.677026, 21.8),
    ]]
    fillet(f15_edges, radius=F15_R)

    # F16 (on Top) → F17 (cut)
    with BuildSketch(Plane.XY):
        with Locations((0, 71.3628157973)):
            Circle(F16_R)
    extrude(amount=-F17_DEPTH, mode=Mode.SUBTRACT)

    # F18 (on Top) → F19 (cut)
    with BuildSketch(Plane.XY):
        with Locations((0, 72.516053915)):
            Circle(F18_R)
        with Locations((0, 72.516053915)):
            Circle(F18_R_2, mode=Mode.SUBTRACT)
    extrude(amount=F19_DEPTH, mode=Mode.SUBTRACT)

    # F18 (on Top) + F19_face (on face) → F20 (cut)
    with BuildSketch(Plane.XY):
        with Locations((0, 72.516053915)):
            Circle(F18_R)
        with Locations((0, 72.516053915)):
            Circle(F18_R_2, mode=Mode.SUBTRACT)
    with BuildSketch(Plane(origin=(0, 72.516053915, 16), x_dir=(1, 0, 0), z_dir=(0, 0, 1))):
        Circle(F19_FACE_R)
    extrude(amount=-F20_DEPTH, mode=Mode.SUBTRACT)

    # F21
    f21_edges = [f1_1.edges().sort_by_distance(p)[0] for p in [
        (-1.314871, 72.516054, 16),
    ]]
    fillet(f21_edges, radius=F21_R)


with BuildPart() as f12:
    # F11 (on Top) → F12 (new body)
    with BuildSketch(Plane.XY):
        with BuildLine():
            Line((-41.1170236766, 49.3229441345), (-46.9156317413, 49.3229441345))
            Line((-46.9156317413, 49.3229441345), (-46.9156317413, 42.8233034909))
            Line((-46.9156317413, 42.8233034909), (-44.3502888083, 42.8233034909))
            Line((-44.3502888083, 42.8233034909), (-40.2086749673, 42.8233034909))
            add(Edge.make_bspline(
                [(-41.1170236766, 49.3229441345), (-39.204246299, 48.9134589045), (-37.7507729109, 48.8444333294), (-36.1566804349, 44.0774895251), (-40.2086749673, 42.8233034909)],
                knots=[0, 0, 0, 0, 0.4415569588, 1, 1, 1, 1], degree=3))
        make_face()
    extrude(amount=F12_DEPTH)


with BuildPart() as f12b:
    # F11 (on Top) → F12, piece 2 (new body)
    with BuildSketch(Plane.XY):
        with BuildLine():
            Line((-46.9156317413, 40.2184464037), (-46.9156317413, 32.8139699996))
            Line((-46.9156317413, 32.8139699996), (-41.1170236766, 32.8139699996))
            add(Edge.make_bspline(
                [(-41.1170236766, 32.8139699996), (-37.7967730165, 33.1756919622), (-35.7796114313, 35.9142584701), (-36.8320122361, 39.5431146026), (-40.2086749673, 40.2184464037)],
                knots=[0, 0, 0, 0, 0.5046489381, 1, 1, 1, 1], degree=3))
            Line((-40.2086749673, 40.2184464037), (-44.3502888083, 40.2184464037))
            Line((-44.3502888083, 40.2184464037), (-46.9156317413, 40.2184464037))
        make_face()
    extrude(amount=F12_DEPTH)


solid = Compound([f1_1.part, f12.part, f12b.part])
